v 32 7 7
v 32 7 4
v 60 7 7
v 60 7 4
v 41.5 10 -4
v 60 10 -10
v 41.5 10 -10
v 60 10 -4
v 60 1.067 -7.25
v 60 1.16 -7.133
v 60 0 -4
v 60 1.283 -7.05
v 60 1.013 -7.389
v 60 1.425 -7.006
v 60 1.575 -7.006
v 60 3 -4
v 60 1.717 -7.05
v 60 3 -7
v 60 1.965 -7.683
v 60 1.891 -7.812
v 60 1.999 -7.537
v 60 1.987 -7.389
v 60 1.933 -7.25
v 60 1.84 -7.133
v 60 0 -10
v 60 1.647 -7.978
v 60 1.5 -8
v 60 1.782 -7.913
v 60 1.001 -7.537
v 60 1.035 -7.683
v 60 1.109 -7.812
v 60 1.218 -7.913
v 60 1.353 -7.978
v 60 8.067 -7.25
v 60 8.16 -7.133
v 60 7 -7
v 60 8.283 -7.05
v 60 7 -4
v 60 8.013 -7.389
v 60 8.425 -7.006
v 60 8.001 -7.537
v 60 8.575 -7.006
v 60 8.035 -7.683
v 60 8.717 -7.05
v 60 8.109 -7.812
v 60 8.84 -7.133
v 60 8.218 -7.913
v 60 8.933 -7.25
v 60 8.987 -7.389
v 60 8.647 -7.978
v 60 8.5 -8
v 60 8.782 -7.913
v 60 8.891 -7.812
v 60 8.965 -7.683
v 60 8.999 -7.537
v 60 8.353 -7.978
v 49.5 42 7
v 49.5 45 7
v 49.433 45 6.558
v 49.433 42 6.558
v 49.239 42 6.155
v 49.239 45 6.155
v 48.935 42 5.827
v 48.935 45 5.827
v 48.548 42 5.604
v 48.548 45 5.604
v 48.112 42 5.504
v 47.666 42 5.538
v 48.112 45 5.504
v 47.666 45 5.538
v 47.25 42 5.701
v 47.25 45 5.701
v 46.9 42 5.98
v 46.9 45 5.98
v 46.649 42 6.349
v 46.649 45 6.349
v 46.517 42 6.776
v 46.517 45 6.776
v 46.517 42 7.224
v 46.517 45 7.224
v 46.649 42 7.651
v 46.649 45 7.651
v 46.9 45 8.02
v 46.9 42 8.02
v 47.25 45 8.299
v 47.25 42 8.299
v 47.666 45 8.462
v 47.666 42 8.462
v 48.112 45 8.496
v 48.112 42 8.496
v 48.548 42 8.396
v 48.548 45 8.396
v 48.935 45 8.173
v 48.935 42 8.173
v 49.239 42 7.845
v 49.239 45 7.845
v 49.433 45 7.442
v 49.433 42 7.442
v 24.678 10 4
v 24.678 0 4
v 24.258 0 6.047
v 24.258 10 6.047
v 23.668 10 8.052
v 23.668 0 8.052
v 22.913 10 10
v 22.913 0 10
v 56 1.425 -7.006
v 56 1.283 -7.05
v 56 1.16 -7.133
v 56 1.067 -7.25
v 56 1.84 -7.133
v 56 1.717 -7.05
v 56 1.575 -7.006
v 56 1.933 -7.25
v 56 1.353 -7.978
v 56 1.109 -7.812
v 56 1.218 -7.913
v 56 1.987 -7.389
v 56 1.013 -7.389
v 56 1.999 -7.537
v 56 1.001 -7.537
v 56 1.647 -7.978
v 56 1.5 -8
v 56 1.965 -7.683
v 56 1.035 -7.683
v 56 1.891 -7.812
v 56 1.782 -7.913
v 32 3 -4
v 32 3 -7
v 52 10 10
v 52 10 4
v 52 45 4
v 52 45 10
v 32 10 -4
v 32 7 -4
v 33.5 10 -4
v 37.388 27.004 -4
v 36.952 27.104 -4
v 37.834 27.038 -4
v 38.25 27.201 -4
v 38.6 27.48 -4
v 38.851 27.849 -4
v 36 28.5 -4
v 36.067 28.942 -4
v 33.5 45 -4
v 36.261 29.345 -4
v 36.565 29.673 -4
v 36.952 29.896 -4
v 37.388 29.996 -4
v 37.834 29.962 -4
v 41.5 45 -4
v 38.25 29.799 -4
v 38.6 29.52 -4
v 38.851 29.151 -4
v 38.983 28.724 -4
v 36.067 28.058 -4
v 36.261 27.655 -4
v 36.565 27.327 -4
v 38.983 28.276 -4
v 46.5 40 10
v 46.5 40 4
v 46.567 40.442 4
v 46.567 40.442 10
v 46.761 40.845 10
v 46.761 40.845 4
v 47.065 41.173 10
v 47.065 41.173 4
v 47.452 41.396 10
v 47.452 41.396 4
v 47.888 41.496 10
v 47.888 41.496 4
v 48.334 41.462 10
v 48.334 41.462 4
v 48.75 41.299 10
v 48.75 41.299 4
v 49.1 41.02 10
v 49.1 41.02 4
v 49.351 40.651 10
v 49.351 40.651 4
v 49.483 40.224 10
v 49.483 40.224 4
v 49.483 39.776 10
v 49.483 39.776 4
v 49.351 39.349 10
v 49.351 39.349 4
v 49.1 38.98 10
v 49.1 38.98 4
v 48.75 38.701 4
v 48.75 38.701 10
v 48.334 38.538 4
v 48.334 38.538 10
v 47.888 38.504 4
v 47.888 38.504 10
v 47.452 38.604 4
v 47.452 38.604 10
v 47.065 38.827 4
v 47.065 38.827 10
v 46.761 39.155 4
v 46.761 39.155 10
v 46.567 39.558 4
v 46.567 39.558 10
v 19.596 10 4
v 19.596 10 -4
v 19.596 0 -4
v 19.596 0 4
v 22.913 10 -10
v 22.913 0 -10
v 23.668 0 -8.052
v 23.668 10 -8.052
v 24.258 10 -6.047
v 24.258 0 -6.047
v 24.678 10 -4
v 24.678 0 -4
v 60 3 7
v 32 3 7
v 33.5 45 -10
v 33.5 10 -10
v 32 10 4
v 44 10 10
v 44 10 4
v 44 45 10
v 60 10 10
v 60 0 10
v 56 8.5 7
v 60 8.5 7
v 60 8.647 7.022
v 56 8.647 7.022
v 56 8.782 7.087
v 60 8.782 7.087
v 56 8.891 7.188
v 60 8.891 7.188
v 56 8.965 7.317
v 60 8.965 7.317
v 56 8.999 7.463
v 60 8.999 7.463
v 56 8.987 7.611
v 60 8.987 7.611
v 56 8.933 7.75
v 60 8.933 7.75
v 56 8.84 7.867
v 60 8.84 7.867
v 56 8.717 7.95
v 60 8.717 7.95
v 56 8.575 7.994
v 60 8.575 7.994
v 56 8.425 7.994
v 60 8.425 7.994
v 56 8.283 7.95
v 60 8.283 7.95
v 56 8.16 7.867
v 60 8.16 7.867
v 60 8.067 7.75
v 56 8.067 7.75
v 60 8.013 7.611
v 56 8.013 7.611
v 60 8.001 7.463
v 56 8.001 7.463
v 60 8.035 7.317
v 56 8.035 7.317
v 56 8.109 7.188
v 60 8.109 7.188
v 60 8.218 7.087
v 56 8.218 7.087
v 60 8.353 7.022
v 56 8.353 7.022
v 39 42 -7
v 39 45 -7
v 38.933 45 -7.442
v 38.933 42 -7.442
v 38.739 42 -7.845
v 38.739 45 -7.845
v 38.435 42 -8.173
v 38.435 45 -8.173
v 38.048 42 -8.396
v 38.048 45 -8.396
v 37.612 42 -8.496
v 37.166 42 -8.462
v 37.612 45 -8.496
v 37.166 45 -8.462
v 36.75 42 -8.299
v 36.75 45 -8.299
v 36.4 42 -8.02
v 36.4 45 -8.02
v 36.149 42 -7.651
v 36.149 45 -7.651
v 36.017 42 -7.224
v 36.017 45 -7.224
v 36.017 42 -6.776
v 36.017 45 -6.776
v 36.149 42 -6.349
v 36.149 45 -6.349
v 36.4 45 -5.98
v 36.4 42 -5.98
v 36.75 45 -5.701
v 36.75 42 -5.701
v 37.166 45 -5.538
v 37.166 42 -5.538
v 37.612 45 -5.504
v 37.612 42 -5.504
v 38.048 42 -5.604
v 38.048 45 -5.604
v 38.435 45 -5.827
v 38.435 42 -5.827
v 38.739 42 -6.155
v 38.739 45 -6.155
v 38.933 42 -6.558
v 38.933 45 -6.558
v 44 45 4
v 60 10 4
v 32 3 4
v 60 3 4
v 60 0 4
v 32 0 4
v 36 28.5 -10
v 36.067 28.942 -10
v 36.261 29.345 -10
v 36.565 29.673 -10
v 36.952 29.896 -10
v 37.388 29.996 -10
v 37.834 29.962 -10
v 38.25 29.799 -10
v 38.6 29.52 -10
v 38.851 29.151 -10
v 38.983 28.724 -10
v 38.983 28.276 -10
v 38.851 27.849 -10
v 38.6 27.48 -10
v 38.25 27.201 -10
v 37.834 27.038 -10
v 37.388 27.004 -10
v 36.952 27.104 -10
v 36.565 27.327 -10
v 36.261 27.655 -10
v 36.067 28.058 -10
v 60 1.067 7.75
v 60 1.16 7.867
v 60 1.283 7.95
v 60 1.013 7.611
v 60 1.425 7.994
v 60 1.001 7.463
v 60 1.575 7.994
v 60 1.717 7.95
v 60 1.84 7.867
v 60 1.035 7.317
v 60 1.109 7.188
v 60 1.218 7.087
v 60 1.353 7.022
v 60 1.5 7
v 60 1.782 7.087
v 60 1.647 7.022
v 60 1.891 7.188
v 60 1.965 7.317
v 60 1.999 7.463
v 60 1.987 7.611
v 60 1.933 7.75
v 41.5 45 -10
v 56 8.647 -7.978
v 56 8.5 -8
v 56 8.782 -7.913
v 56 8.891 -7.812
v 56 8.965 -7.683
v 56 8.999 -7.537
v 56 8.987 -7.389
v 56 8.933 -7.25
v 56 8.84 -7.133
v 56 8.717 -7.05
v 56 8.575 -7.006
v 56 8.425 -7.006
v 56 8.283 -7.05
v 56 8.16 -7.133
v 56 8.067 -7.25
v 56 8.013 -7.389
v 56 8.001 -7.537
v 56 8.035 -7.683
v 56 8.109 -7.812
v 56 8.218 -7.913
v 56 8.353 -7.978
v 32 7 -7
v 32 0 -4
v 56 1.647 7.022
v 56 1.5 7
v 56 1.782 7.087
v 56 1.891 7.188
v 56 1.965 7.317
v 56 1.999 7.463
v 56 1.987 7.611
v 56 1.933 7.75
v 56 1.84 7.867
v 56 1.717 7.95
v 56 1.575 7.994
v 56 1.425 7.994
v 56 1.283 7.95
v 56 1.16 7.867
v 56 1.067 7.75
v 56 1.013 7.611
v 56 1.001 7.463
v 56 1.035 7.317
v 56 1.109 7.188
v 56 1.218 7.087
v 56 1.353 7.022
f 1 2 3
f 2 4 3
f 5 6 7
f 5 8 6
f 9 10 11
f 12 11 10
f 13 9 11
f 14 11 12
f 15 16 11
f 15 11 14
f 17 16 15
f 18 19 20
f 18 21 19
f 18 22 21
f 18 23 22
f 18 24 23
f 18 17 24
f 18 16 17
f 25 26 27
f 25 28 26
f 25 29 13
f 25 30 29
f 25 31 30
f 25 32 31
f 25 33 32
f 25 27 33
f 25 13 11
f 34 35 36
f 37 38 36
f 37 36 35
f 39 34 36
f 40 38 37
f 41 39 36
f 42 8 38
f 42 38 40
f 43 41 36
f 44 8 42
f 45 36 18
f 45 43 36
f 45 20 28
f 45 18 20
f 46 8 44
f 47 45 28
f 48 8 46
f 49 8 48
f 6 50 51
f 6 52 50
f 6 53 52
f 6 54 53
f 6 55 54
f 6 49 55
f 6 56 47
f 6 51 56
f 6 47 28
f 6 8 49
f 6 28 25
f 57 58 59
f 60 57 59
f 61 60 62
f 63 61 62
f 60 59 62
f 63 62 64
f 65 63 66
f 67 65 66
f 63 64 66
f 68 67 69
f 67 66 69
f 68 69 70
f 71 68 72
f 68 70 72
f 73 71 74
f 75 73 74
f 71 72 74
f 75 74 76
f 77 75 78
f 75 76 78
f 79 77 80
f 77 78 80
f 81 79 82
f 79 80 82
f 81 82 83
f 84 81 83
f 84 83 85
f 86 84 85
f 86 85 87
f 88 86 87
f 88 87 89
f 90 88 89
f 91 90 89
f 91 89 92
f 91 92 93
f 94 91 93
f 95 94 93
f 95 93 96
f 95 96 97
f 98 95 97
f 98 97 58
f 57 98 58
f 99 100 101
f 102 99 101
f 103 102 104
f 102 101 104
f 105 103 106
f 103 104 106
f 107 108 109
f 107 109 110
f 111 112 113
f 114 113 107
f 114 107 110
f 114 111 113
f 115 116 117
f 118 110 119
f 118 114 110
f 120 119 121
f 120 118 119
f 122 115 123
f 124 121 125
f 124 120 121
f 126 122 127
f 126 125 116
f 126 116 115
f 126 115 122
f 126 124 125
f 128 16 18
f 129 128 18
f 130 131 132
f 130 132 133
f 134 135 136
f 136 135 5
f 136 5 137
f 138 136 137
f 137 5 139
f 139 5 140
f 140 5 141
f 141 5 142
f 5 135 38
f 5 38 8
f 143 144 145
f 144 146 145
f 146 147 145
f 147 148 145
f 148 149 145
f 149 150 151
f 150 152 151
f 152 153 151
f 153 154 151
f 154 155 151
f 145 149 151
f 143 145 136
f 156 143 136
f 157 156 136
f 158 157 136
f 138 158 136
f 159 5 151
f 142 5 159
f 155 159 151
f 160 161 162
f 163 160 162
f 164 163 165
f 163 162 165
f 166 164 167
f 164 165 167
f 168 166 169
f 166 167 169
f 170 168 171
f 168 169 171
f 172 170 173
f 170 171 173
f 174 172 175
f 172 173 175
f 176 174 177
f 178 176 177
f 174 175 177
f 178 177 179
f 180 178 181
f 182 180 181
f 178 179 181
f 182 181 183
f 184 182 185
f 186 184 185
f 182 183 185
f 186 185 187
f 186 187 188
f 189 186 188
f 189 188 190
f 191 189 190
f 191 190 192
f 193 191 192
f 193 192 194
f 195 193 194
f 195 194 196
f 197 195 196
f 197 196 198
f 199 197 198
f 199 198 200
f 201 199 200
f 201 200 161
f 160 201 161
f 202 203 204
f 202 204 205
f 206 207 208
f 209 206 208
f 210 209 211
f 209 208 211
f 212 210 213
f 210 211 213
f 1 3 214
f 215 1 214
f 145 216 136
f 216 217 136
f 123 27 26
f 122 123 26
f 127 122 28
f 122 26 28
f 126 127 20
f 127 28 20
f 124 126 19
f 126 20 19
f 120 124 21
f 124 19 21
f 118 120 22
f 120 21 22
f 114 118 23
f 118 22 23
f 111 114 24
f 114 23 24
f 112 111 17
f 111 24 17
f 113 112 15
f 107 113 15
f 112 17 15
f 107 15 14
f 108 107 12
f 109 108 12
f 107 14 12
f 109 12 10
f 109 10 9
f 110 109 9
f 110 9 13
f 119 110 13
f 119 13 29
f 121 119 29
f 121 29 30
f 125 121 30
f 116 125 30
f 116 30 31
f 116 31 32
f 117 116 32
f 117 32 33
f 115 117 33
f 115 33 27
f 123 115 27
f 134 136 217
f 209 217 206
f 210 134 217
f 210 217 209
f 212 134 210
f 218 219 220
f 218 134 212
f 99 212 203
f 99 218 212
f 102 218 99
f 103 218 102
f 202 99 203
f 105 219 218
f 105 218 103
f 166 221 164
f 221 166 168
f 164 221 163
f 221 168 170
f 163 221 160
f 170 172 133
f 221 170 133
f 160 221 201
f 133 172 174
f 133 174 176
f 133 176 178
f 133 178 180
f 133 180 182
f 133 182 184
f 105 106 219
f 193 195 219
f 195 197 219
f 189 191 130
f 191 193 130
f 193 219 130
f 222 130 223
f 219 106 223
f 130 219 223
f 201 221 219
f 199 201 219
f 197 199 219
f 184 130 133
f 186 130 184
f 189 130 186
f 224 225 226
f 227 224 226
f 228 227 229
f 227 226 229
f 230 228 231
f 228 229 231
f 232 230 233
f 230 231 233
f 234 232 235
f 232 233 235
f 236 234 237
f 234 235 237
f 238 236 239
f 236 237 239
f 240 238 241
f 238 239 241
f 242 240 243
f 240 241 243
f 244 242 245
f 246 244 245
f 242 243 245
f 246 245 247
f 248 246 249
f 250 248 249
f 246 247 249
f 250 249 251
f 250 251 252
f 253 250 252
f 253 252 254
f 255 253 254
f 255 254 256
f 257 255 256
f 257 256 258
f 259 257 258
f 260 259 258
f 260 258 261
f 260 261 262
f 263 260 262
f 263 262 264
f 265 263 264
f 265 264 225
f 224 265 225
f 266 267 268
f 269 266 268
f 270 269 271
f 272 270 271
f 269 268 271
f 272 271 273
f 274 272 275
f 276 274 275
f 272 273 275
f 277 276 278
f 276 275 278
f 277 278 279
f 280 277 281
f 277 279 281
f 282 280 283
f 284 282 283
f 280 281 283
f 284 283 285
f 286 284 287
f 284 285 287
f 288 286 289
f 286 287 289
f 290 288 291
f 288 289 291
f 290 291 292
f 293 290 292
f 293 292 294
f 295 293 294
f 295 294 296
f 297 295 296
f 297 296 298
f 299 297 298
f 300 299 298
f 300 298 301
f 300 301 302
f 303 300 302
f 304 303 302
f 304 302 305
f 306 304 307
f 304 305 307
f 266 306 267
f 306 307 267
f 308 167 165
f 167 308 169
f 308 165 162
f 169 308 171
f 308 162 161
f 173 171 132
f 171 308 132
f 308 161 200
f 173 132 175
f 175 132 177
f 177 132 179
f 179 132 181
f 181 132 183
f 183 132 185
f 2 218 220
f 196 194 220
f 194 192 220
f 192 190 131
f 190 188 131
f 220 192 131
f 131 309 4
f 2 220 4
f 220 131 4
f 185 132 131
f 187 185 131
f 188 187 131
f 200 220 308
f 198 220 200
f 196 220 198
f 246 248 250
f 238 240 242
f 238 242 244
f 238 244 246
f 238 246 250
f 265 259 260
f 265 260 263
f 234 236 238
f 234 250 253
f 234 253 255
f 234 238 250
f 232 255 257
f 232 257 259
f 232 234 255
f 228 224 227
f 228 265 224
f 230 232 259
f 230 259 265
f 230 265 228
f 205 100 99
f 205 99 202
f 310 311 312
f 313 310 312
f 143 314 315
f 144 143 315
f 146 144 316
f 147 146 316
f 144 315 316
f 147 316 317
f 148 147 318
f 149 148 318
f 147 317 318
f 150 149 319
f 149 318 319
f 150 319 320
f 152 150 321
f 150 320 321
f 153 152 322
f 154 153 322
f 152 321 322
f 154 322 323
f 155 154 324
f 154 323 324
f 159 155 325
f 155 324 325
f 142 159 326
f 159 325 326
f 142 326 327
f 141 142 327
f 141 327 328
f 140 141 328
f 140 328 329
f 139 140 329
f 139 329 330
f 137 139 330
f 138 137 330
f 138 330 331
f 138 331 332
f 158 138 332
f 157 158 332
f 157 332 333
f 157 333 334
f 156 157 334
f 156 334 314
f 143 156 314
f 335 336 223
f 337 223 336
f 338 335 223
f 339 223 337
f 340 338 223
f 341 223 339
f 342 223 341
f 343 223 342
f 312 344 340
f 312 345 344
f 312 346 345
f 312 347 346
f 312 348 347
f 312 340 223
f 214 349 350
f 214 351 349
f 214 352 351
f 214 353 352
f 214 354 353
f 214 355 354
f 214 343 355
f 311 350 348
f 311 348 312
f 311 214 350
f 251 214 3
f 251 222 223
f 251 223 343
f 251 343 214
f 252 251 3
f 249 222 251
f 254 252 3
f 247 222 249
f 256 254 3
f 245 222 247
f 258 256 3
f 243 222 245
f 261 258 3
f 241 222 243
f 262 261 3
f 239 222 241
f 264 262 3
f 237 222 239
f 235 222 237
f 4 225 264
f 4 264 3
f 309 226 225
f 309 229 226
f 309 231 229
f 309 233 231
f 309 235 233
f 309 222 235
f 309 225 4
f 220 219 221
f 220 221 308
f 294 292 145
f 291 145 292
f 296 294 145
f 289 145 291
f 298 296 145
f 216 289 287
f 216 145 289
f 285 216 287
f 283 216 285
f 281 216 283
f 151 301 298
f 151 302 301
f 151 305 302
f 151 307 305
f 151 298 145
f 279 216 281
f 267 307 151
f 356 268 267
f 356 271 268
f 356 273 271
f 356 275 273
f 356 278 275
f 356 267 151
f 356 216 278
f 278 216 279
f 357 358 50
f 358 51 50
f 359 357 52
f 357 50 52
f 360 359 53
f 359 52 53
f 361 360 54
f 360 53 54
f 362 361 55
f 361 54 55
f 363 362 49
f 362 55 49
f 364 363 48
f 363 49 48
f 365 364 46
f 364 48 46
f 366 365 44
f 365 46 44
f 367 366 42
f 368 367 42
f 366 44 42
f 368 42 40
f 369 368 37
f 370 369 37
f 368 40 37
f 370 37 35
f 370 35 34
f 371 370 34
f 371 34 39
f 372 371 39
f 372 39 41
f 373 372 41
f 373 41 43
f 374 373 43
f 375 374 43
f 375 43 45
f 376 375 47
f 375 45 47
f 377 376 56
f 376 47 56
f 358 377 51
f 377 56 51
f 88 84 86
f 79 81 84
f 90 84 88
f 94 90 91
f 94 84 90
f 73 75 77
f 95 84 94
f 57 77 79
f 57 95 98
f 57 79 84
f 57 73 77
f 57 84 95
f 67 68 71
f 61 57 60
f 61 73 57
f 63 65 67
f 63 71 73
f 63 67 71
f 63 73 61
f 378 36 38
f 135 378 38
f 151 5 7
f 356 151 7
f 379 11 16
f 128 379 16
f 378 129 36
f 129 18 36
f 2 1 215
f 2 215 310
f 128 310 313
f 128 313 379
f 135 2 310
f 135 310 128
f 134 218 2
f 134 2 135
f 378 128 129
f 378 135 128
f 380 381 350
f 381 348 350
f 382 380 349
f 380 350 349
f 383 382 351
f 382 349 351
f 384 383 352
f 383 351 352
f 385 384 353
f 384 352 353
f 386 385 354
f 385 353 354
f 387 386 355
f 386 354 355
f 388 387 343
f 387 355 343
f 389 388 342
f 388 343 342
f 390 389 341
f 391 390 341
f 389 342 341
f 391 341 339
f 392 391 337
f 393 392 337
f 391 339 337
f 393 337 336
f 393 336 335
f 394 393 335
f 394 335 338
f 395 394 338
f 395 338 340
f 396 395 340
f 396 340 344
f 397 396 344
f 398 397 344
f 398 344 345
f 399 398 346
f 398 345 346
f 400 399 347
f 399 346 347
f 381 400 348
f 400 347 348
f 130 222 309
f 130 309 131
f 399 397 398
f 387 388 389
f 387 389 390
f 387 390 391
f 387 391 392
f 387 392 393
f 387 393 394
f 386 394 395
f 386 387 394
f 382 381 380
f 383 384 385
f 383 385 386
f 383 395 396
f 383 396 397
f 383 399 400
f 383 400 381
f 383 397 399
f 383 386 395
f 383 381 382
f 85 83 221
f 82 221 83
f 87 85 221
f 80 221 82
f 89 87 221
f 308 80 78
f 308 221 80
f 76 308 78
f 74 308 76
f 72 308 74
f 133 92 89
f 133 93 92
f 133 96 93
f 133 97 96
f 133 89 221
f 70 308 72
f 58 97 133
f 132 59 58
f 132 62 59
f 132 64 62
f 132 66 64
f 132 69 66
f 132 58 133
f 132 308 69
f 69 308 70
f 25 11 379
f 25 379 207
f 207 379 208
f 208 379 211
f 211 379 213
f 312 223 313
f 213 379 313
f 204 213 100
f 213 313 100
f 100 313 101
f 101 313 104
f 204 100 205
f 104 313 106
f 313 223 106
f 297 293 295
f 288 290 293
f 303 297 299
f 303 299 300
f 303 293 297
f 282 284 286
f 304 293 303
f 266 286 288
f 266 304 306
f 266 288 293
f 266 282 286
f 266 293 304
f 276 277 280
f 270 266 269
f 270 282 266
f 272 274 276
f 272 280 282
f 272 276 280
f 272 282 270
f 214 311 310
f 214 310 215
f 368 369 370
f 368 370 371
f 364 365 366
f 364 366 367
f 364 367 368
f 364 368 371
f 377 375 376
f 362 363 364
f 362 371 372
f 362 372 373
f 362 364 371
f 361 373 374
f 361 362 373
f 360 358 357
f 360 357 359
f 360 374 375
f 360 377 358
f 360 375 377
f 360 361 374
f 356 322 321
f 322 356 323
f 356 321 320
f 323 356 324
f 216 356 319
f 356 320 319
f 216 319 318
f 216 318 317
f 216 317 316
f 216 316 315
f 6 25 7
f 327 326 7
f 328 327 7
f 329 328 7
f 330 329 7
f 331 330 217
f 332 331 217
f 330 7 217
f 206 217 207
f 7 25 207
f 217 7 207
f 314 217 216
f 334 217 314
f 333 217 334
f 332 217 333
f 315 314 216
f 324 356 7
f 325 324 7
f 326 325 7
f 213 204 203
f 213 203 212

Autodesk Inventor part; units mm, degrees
ref_plane "YZ Plane" through (0, 0, 0) normal (1, 0, 0) x (0, 1, 0)
ref_plane "XZ Plane" through (0, 0, 0) normal (0, 1, 0) x (-1, 0, 0)
ref_plane "XY Plane" through (0, 0, 0) normal (0, 0, 1) x (1, 0, 0)
sketch "Sketch1" plane through (0, 0, 0) normal (0, 1, 0) x (-1, 0, 0)
  line L0 (0, 0) -> (50, 0) construction
  line L1 (0, 0) -> (50, 0) construction
  line L2 (34.573, 37.4794) -> (12.6591, 21.558)
  line L3 (46.3287, 21.2991) -> (24.4148, 5.3777)
  line L4 (46.3287, -21.2991) -> (24.4148, -5.3777)
  line L5 (34.573, -37.4794) -> (12.6591, -21.558)
  line L6 (-50, -10) -> (-22.9129, -10)
  line L7 (56.6312, -41.145) -> (50.7533, -49.2351)
  line L8 (50.7533, -49.2351) -> (62.509, -33.0548)
  line L9 (62.509, -33.0548) -> (46.3287, -21.2991)
  line L10 (50.7533, -49.2351) -> (34.573, -37.4794)
  line L11 (46.3287, 21.2991) -> (62.509, 33.0548)
  line L12 (62.509, 33.0548) -> (50.7533, 49.2351)
  line L13 (50.7533, 49.2351) -> (34.573, 37.4794)
  line L14 (-50, 10) -> (-70, 10)
  line L15 (-70, 10) -> (-70, -10)
  line L16 (-70, -10) -> (-50, -10)
  line L17 (0, 0) -> (-36, 0)
  circle A0 centre (0, 0) radius 25
  line L18 (-22.9129, 10) -> (-50, 10)
  dimension "d52" = 10
  dimension "d53" = 20
  dimension "d67" = 36
  dimension "d68" = 50
extrude "Extrusion1" add sketch "Sketch1" along normal blind 10
sketch "Sketch8" plane through (-62.509, 0, -33.0548) normal (-0.809, 0, -0.5878) x (-0.5878, 0, 0.809)
  line L0 (-10, 3) -> (-14, 3)
  line L1 (-17, 3) -> (-14, 3)
  line L2 (-3, 3) -> (-3, 7)
  line L3 (-3, 7) -> (-6, 7)
  line L4 (-17, 7) -> (-17, 3)
  line L5 (-10, 0) -> (-6, 0)
  line L6 (14.8816, 0) -> (-15.3777, 0) projected
  line L7 (-6, 0) -> (-6, 3)
  line L8 (-6, 7) -> (-6, 10)
  line L9 (14.8816, 10) -> (-15.3777, 10) projected
  line L10 (-6, 10) -> (-14, 10)
  line L11 (-14, 10) -> (-14, 7)
  line L12 (-14, 3) -> (-14, 0)
  line L13 (-14, 3) -> (-17, 3)
  line L14 (-6, 3) -> (-3, 3)
  line L15 (-14, 7) -> (-17, 7)
  point P0 (-14, 10)
  point P1 (-14, 0)
  dimension "d85" = 3
  dimension "d86" = 7
  dimension "d87" = 14
  dimension "d88" = 4
  dimension "d89" = 4
  dimension "d90" = 8
extrude "Extrusion7" cut sketch "Sketch8" against normal blind 38
sketch "Sketch9" plane through (-50.7533, 0, 49.2351) normal (-0.809, 0, 0.5878) x (0.5878, 0, 0.809)
  line L0 (-10, 3) -> (-14, 3)
  line L1 (-17, 3) -> (-14, 3)
  line L2 (-3, 3) -> (-3, 7)
  line L3 (-3, 7) -> (-6, 7)
  line L4 (-17, 7) -> (-17, 3)
  line L5 (-10, 0) -> (-6, 0)
  line L6 (-6, 0) -> (-6, 3)
  line L7 (-6, 7) -> (-6, 10)
  line L8 (-6, 10) -> (-14, 10)
  line L9 (-14, 10) -> (-14, 7)
  line L10 (-14, 3) -> (-14, 0)
  line L11 (-14, 3) -> (-17, 3)
  line L12 (-6, 3) -> (-3, 3)
  line L13 (-14, 7) -> (-17, 7)
  line L14 (-14, 0) -> (-6, 0)
  line L15 (-6, 3) -> (-3, 3)
  line L16 (-3, 7) -> (-6, 7)
  line L17 (-6, 10) -> (-14, 10)
  line L18 (-4.6223, 10) -> (-34.8816, 10) projected
  line L19 (-14, 10) -> (-14, 7)
  line L20 (-17, 7) -> (-14, 7)
  line L21 (-17, 7) -> (-17, 3)
  line L22 (-14, 3) -> (-17, 3)
  line L23 (-14, 3) -> (-14, 0)
  line L24 (-4.6223, 0) -> (-34.8816, 0) projected
  line L25 (-3, 3) -> (-3, 7)
  line L26 (-6, 7) -> (-6, 10)
  line L27 (-6, 3) -> (-6, 0)
  point P0 (-10, 0)
  point P1 (-15.3777, 0)
  point P2 (-15.3777, 10)
  point P3 (-10, 0)
  dimension "d93" = 3
  dimension "d94" = 7
  dimension "d95" = 14
  dimension "d96" = 4
  dimension "d97" = 4
  dimension "d98" = 8
extrude "Extrusion8" cut sketch "Sketch9" against normal blind 38
sketch "Sketch10" plane through (70, 0, 10) normal (1, 0, 0) x (0, 0, -1)
  line L0 (10, 0) -> (10, 3)
  line L1 (10, 3) -> (17, 3)
  line L2 (17, 3) -> (3, 3)
  line L3 (3, 3) -> (6, 3)
  line L4 (6, 3) -> (6, 0)
  line L5 (0, 0) -> (20, 0) projected
  line L6 (6, 0) -> (14, 0)
  line L7 (14, 0) -> (14, 3)
  line L8 (17, 3) -> (17, 7)
  line L9 (17, 7) -> (3, 7)
  line L10 (3, 7) -> (3, 3)
  line L11 (14, 7) -> (14, 10)
  line L12 (0, 10) -> (20, 10) projected
  line L13 (6, 10) -> (14, 10)
  line L14 (6, 10) -> (6, 7)
  dimension "d101" = 3
  dimension "d102" = 7
  dimension "d103" = 14
  dimension "d104" = 3
  dimension "d105" = 8
  dimension "d106" = 4
extrude "Extrusion9" cut sketch "Sketch10" against normal blind 38
sketch "Sketch12" plane through (70, 0, 10) normal (1, 0, 0) x (0, 0, -1)
  line L0 (20, 10) -> (0, 10) projected
  line L1 (43.0548, 0) -> (15.3777, 0) projected
  line L2 (0, 10) -> (20, 10)
  line L3 (20, 10) -> (20, 0)
  line L4 (20, 0) -> (0, 0)
  line L5 (0, 0) -> (0, 10)
  line L6 (0, 10) -> (2.5, 10)
  circle A0 centre (2.5, 8.5) radius 0.5
  circle A1 centre (2.5, 1.5) radius 0.5
  circle A2 centre (17.5, 1.5) radius 0.5
  circle A3 centre (17.5, 8.5) radius 0.5
  point P0 (10, 0)
  point P1 (16.8377, 0)
  point P2 (16.8377, 0)
  dimension "d119" = 20
  dimension "d120" = 2.5
  dimension "d123" = 1
  dimension "d126" = 1
  dimension "d127" = 1
  dimension "d128" = 1
extrude "Extrusion14" cut sketch "Sketch12" against normal blind 10
extrude "Extrusion15" cut sketch "Sketch12" against normal blind 14 contours A0 | A1 | A2 | A3
sketch "Sketch13" plane through (-50.7533, 0, -49.2351) normal (-0.809, 0, -0.5878) x (-0.5878, 0, 0.809)
  line L0 (20, 10) -> (0, 10)
  line L1 (0, 10) -> (20, 10)
  line L2 (20, 10) -> (20, 0)
  line L3 (20, 0) -> (0, 0)
  line L4 (0, 0) -> (0, 10)
  line L5 (0, 10) -> (2.5, 10)
  circle A0 centre (2.5, 8.5) radius 0.5
  circle A1 centre (2.5, 1.5) radius 0.5
  circle A2 centre (17.5, 1.5) radius 0.5
  circle A3 centre (17.5, 8.5) radius 0.5
  point P0 (10, 0)
  point P1 (10, 0)
  point P2 (16.8377, 0)
  point P3 (20, 10)
  dimension "d133" = 20
  dimension "d134" = 2.5
  dimension "d135" = 1
  dimension "d136" = 1
  dimension "d137" = 1
  dimension "d138" = 1
extrude "Extrusion16" cut sketch "Sketch13" against normal blind 10
extrude "Extrusion17" cut sketch "Sketch13" against normal blind 14 contours A0 | A1 | A2 | A3
sketch "Sketch14" plane through (-62.509, 0, 33.0548) normal (-0.809, 0, 0.5878) x (0.5878, 0, 0.809)
  line L0 (20, 10) -> (0, 10)
  line L1 (0, 10) -> (20, 10)
  line L2 (20, 10) -> (20, 0)
  line L3 (20, 0) -> (0, 0)
  line L4 (0, 0) -> (0, 10)
  line L5 (0, 10) -> (2.5, 10)
  circle A0 centre (2.5, 8.5) radius 0.5
  circle A1 centre (2.5, 1.5) radius 0.5
  circle A2 centre (17.5, 1.5) radius 0.5
  circle A3 centre (17.5, 8.5) radius 0.5
  point P0 (10, 0)
  point P1 (10, 0)
  point P2 (10, 0)
  point P3 (16.8377, 0)
  point P4 (20, 10)
  point P5 (20, 10)
  dimension "d143" = 20
  dimension "d144" = 2.5
  dimension "d145" = 1
  dimension "d146" = 1
  dimension "d147" = 1
  dimension "d148" = 1
extrude "Extrusion18" cut sketch "Sketch14" against normal blind 10
extrude "Extrusion19" cut sketch "Sketch14" against normal blind 14 contours A0 | A1 | A2 | A3
sketch "Sketch30" plane through (0, 10, 0) normal (0, 1, 0) x (1, 0, 0)
  line L0 (44, -4) -> (45, -4)
  line L1 (44, -4) -> (52, -4)
  line L2 (52, -4) -> (52, -10)
  line L3 (52, -10) -> (44, -10)
  line L4 (44, -10) -> (44, -4)
  line L5 (33.5, 4) -> (41.5, 4)
  line L6 (41.5, 4) -> (41.5, 10)
  line L7 (41.5, 10) -> (33.5, 10)
  line L8 (33.5, 10) -> (33.5, 4)
  line L9 (-24.7509, -22.9269) -> (-31.2231, -27.6292)
  line L10 (-31.2231, -27.6292) -> (-27.6611, -32.4577)
  line L11 (-27.6611, -32.4577) -> (-21.189, -27.7554)
  line L12 (-21.189, -27.7554) -> (-24.7509, -22.9269)
  line L13 (-50.8922, -32.031) -> (-28.2397, -15.5731) projected
  line L14 (-37.9479, -22.6265) -> (-44.42, -27.3288)
  line L15 (-44.42, -27.3288) -> (-47.9467, -22.4747)
  line L16 (-24.4148, -5.3777) -> (-54.4189, -27.1769) projected
  line L17 (-47.9467, -22.4747) -> (-41.4746, -17.7724)
  line L18 (-41.4746, -17.7724) -> (-37.9479, -22.6265)
  line L19 (-28.2397, 15.5731) -> (-50.8922, 32.031) projected
  line L20 (-50.8922, 32.031) -> (-28.2397, 15.5731) projected
  line L21 (-28.2397, 15.5731) -> (-29.4532, 16.4547)
  line L22 (-29.4532, 16.4547) -> (-32.9799, 11.6006)
  line L23 (-54.4189, 27.1769) -> (-24.4148, 5.3777) projected
  line L24 (-29.4532, 16.4547) -> (-35.9253, 21.157)
  line L25 (-35.9253, 21.157) -> (-39.4521, 16.3029)
  line L26 (-39.4521, 16.3029) -> (-32.9799, 11.6006)
  line L27 (-46.1899, 38.5032) -> (-23.5374, 22.0452) projected
  line L28 (-33.2456, 29.0986) -> (-39.7177, 33.8009)
  line L29 (-39.7177, 33.8009) -> (-36.191, 38.655)
  line L30 (-12.6591, 21.558) -> (-42.6632, 43.3573) projected
  line L31 (-33.2456, 29.0986) -> (-29.7189, 33.9527)
  line L32 (-46.1899, 38.5032) -> (-23.5374, 22.0452) projected
  line L33 (-29.7189, 33.9527) -> (-36.191, 38.655)
  point P0 (0, 0)
  point P1 (32, 4)
  point P2 (42, 10)
  point P3 (34, 10)
  point P4 (41, 10)
  point P5 (-23.5374, -22.0452)
  dimension "d249" = 1
  dimension "d251" = 8
  dimension "d258" = 8
  dimension "d268" = 8
  dimension "d269" = 1.5
  dimension "d270" = 8
  dimension "d271" = 8
  dimension "d278" = 12
  dimension "d279" = 8
  dimension "d282" = 1.5
  dimension "d283" = 8
  dimension "d284" = 12
  dimension "d285" = 8
extrude "Extrusion35" add sketch "Sketch30" along normal blind 35
sketch "Sketch31" plane through (22.9129, 0, -10) normal (0, 0, -1) x (-1, 0, 0)
  line L0 (-9.0871, 45) -> (-19.0871, 45) projected
  circle A0 centre (-14.5871, 28.5) radius 1.5
  point P0 (22.9129, 0)
  dimension "d264" = 3
extrude "Extrusion36" cut sketch "Sketch31" against normal up to next
sketch "Sketch32" plane through (32, 7, 4) normal (0, 0, -1) x (-1, 0, 0)
  line L0 (-20, 38) -> (-12, 38) projected
  line L1 (-16, 38) -> (-16, 33)
  circle A0 centre (-16, 33) radius 1.5
  point P0 (32, -7)
  dimension "d253" = 5
  dimension "d254" = 3
extrude "Extrusion37" cut sketch "Sketch32" against normal up to next
sketch "Sketch33" plane through (-23.5374, 7, 22.0452) normal (-0.5878, 0, -0.809) x (-0.809, 0, 0.5878)
  line L0 (9.4564, 38) -> (1.4564, 38) projected
  line L1 (5.4564, 38) -> (5.4564, 21.5)
  circle A0 centre (5.4564, 21.5) radius 1.5
  point P0 (-32, -7)
  dimension "d286" = 16.5
  dimension "d287" = 3
sketch "Sketch34" plane through (-24.4148, 0, 5.3777) normal (-0.5878, 0, -0.809) x (-0.809, 0, 0.5878)
  line L0 (29.0871, 45) -> (21.0871, 45) projected
  line L1 (25.0871, 45) -> (25.0871, 40)
  circle A0 centre (25.0871, 40) radius 1.5
  point P0 (-22.9129, 0)
  dimension "d288" = 5
  dimension "d289" = 3
sketch "Sketch35" plane through (-28.2397, 7, -15.5731) normal (0.5878, 0, -0.809) x (-0.809, 0, -0.5878)
  line L0 (1.5, 38) -> (9.5, 38) projected
  line L1 (5.5, 38) -> (5.5, 21.5)
  circle A0 centre (5.5, 21.5) radius 1.5
  point P0 (-32, -7)
  dimension "d290" = 16.5
  dimension "d291" = 3
sketch "Sketch36" plane through (-12.6591, 0, -21.558) normal (0.5878, 0, -0.809) x (-0.809, 0, -0.5878)
  line L0 (29.0871, 45) -> (21.0871, 45) projected
  line L1 (25.0871, 45) -> (25.0871, 40)
  circle A0 centre (25.0871, 40) radius 1.5
  point P0 (-22.9129, 0)
  dimension "d292" = 5
  dimension "d293" = 3
extrude "Extrusion38" cut sketch "Sketch36" against normal up to next
extrude "Extrusion39" cut sketch "Sketch35" against normal up to next
extrude "Extrusion40" cut sketch "Sketch34" against normal up to next
extrude "Extrusion41" cut sketch "Sketch33" against normal up to next
sketch "Sketch37" plane through (0, 10, 0) normal (0, 1, 0) x (1, 0, 0)
  circle A0 centre (0, 0) radius 25
  circle A1 centre (0, 0) radius 22.5
  line L0 (-23.5374, 22.0452) -> (-15.5618, 16.2506)
  line L1 (-23.5374, 22.0452) -> (-13.679, 22.0452) construction
  line L2 (-50.8922, 32.031) -> (-28.2397, 15.5731) projected
  line L3 (-28.2397, 15.5731) -> (-20.2641, 9.7784)
  line L4 (-28.2397, -15.5731) -> (-20.2641, -9.7784)
  line L5 (-23.5374, -22.0452) -> (-15.5618, -16.2506)
  line L6 (60, 4) -> (32, 4) projected
  line L7 (32, 4) -> (22.1416, 4)
  line L8 (32, -4) -> (22.1416, -4)
  circle A2 centre (0, 0) radius 21.25
  line L9 (-20.2641, -9.7784) -> (-19.2354, -9.0311)
  line L10 (-15.5618, -16.2506) -> (-14.5332, -15.5032)
  line L11 (-20.2641, 9.7784) -> (-19.2354, 9.0311)
  line L12 (-15.5618, 16.2506) -> (-14.5332, 15.5032)
  line L13 (22.1416, 4) -> (20.8701, 4)
  line L14 (22.1416, -4) -> (20.8701, -4)
  circle A3 centre (0, 0) radius 22.5
  circle A4 centre (0, 0) radius 21.25
  circle A5 centre (0, 0) radius 20
  line L15 (-19.2354, 9.0311) -> (-18.2046, 8.2821)
  line L16 (-14.5332, 15.5032) -> (-13.5023, 14.7543)
  line L17 (20.8701, -4) -> (19.5959, -4)
  line L18 (20.8701, 4) -> (19.5959, 4)
  line L19 (-14.5332, -15.5032) -> (-13.5023, -14.7543)
  line L20 (-19.2354, -9.0311) -> (-18.2046, -8.2821)
  point P0 (24.6779, -4)
  point P1 (-17.6137, -17.7414)
  point P2 (-22.316, -11.2693)
  point P3 (-22.316, 11.2693)
  point P4 (24.6779, 4)
  point P5 (-17.6137, 17.7414)
  dimension "d302" = 45
  dimension "d303" = 36
  dimension "d306" = 42.5
  dimension "d315" = 45
  dimension "d316" = 42.5
  dimension "d317" = 40
extrude "Extrusion42" add sketch "Sketch37" along normal blind 23 contours L7 A1 L0 A0 | A0 L5 A1 L8 | L13 A2 L12 A1 | A1 L10 A2 L14 | L3 A1 L4 A0 | L18 A5 L16 A2 | A2 L19 A5 L17 | L11 A2 L9 A1 | L15 A5 L20 A2
sketch "Sketch38" plane through (0, 33, 0) normal (0, 1, 0) x (1, 0, 0)
  line L0 (22.1416, 4) -> (20.8701, 4)
  line L1 (22.1416, -4) -> (20.8701, -4)
  line L2 (24.6779, 4) -> (22.1416, 4)
  line L3 (24.6779, -4) -> (22.1416, -4)
  line L4 (-15.5618, -16.2506) -> (-14.5332, -15.5032)
  line L5 (-15.5618, 16.2506) -> (-14.5332, 15.5032)
  line L6 (-20.2641, -9.7784) -> (-19.2354, -9.0311)
  line L7 (-17.6137, -17.7414) -> (-15.5618, -16.2506)
  line L8 (-22.316, -11.2693) -> (-20.2641, -9.7784)
  line L9 (-20.2641, 9.7784) -> (-19.2354, 9.0311)
  line L10 (-17.6137, 17.7414) -> (-15.5618, 16.2506)
  line L11 (-22.316, 11.2693) -> (-20.2641, 9.7784)
  line L12 (-23.5374, 22.0452) -> (-13.679, 22.0452) construction
  arc A0 (-17.6137, -17.7414) -> (24.6779, -4) centre (0, 0) ccw
  arc A1 (24.6779, 4) -> (-17.6137, 17.7414) centre (0, 0) ccw
  arc A2 (-22.316, 11.2693) -> (-22.316, -11.2693) centre (0, 0) ccw
  line L13 (20.8701, 4) -> (15.8701, 4)
  line L14 (15.8701, 4) -> (15.8701, -4)
  line L15 (15.8701, -4) -> (20.8701, -4)
  line L16 (-14.5332, 15.5032) -> (-10.4881, 12.5643)
  line L17 (-10.4881, 12.5643) -> (-15.1903, 6.0922)
  line L18 (-15.1903, 6.0922) -> (-19.2354, 9.0311)
  line L19 (-19.2354, -9.0311) -> (-15.1903, -6.0922)
  line L20 (-15.1903, -6.0922) -> (-10.4881, -12.5643)
  line L21 (-10.4881, -12.5643) -> (-14.5332, -15.5032)
  circle A3 centre (-22.5, 0) radius 1.5
  circle A4 centre (0, 22.5) radius 1.5
  circle A5 centre (18.2029, 13.2252) radius 1.5
  circle A6 centre (18.2029, -13.2252) radius 1.5
  circle A7 centre (0, -22.5) radius 1.5
  point P0 (-23.5374, -22.0452)
  point P1 (-28.2397, -15.5731)
  dimension "d307" = 36
  dimension "d308" = 5
  dimension "d309" = 5
  dimension "d310" = 3
  dimension "d311" = 3
  dimension "d312" = 3
  dimension "d313" = 3
  dimension "d314" = 3
extrude "Extrusion43" cut sketch "Sketch38" against normal blind 10 contours A3 | A4 | A5 | A6 | A7
sketch "Sketch39" plane through (0, 45, 0) normal (0, 1, 0) x (1, 0, 0)
  line L0 (-37.9479, -22.6265) -> (-41.4746, -17.7724) projected
  line L1 (-47.9467, -22.4747) -> (-44.42, -27.3288) projected
  line L2 (-31.2231, -27.6292) -> (-27.6611, -32.4577) projected
  circle A0 centre (-42.9473, -22.5506) radius 1.5
  circle A1 centre (-26.2405, -27.6816) radius 1.5
  line L3 (-29.7189, 33.9527) -> (-36.191, 38.655) projected
  line L4 (-39.7177, 33.8009) -> (-33.2456, 29.0986) projected
  line L5 (-29.4532, 16.4547) -> (-35.9253, 21.157) projected
  line L6 (41.5, 10) -> (33.5, 10) projected
  line L7 (33.5, 4) -> (41.5, 4) projected
  line L8 (44, -10) -> (52, -10) projected
  circle A2 centre (48, -7) radius 1.5
  circle A3 centre (37.5, 7) radius 1.5
  circle A4 centre (-34.7183, 33.8768) radius 1.5
  circle A5 centre (-34.4526, 16.3788) radius 1.5
  point P0 (0, 0)
  point P1 (-32.9799, 11.6006)
  point P2 (44, -4)
  dimension "d320" = 3
  dimension "d321" = 3
  dimension "d322" = 3
  dimension "d323" = 3
  dimension "d325" = 3
extrude "Extrusion44" cut sketch "Sketch39" against normal blind 3
sketch "Sketch40" plane through (0, 33, 0) normal (0, 1, 0) x (1, 0, 0)
  circle A0 centre (0, 0) radius 25
  circle A1 centre (0, 0) radius 91.0936
  line L0 (33.5, 10) -> (22.9129, 10) projected
  line L1 (22.9129, 10) -> (22.9129, 91.0936)
  line L2 (22.9129, 91.0936) -> (22.9129, 10)
  arc A2 (22.9129, 10) -> (-12.6591, 21.558) centre (0, 0) ccw projected
  line L3 (22.9129, -10) -> (22.9129, -88.1648)
  point P0 (22.9129, 88.1648)
extrude "Extrusion45" cut sketch "Sketch40" along normal through all both and the other way through all contours A0 | A0 L3 A1 L1 picked at (-50.6626, -46.6253)
sketch "Sketch41" plane through (0, 10, 0) normal (0, 1, 0) x (1, 0, 0)
  circle A0 centre (0, 0) radius 25
  arc A1 (22.9129, -10) -> (22.9129, 10) centre (0, 0) ccw projected
  line L0 (25, -3) -> (25, 0)
  line L1 (25, 0) -> (25, 3)
  line L2 (25, 3) -> (25, -3)
  line L3 (20, 4) -> (25, 4)
  line L4 (25, 4) -> (25, -4)
  line L5 (25, -4) -> (20, -4)
  line L6 (19.596, -3) -> (19.596, 4)
  line L7 (19.596, 4) -> (20, 4)
  line L8 (19.596, -3) -> (19.596, -4)
  line L9 (19.596, -4) -> (20, -4)
  point P0 (24.6779, 4)
  point P1 (24.6779, -4)
  dimension "d333" = 3
  dimension "d338" = 8
extrude "Extrusion47" add sketch "Sketch41" against normal blind 10 contours A0 L5 L9 L8 L6 L7 L3 picked at (21.532, 0.3333)
properties part number "basePart2"
